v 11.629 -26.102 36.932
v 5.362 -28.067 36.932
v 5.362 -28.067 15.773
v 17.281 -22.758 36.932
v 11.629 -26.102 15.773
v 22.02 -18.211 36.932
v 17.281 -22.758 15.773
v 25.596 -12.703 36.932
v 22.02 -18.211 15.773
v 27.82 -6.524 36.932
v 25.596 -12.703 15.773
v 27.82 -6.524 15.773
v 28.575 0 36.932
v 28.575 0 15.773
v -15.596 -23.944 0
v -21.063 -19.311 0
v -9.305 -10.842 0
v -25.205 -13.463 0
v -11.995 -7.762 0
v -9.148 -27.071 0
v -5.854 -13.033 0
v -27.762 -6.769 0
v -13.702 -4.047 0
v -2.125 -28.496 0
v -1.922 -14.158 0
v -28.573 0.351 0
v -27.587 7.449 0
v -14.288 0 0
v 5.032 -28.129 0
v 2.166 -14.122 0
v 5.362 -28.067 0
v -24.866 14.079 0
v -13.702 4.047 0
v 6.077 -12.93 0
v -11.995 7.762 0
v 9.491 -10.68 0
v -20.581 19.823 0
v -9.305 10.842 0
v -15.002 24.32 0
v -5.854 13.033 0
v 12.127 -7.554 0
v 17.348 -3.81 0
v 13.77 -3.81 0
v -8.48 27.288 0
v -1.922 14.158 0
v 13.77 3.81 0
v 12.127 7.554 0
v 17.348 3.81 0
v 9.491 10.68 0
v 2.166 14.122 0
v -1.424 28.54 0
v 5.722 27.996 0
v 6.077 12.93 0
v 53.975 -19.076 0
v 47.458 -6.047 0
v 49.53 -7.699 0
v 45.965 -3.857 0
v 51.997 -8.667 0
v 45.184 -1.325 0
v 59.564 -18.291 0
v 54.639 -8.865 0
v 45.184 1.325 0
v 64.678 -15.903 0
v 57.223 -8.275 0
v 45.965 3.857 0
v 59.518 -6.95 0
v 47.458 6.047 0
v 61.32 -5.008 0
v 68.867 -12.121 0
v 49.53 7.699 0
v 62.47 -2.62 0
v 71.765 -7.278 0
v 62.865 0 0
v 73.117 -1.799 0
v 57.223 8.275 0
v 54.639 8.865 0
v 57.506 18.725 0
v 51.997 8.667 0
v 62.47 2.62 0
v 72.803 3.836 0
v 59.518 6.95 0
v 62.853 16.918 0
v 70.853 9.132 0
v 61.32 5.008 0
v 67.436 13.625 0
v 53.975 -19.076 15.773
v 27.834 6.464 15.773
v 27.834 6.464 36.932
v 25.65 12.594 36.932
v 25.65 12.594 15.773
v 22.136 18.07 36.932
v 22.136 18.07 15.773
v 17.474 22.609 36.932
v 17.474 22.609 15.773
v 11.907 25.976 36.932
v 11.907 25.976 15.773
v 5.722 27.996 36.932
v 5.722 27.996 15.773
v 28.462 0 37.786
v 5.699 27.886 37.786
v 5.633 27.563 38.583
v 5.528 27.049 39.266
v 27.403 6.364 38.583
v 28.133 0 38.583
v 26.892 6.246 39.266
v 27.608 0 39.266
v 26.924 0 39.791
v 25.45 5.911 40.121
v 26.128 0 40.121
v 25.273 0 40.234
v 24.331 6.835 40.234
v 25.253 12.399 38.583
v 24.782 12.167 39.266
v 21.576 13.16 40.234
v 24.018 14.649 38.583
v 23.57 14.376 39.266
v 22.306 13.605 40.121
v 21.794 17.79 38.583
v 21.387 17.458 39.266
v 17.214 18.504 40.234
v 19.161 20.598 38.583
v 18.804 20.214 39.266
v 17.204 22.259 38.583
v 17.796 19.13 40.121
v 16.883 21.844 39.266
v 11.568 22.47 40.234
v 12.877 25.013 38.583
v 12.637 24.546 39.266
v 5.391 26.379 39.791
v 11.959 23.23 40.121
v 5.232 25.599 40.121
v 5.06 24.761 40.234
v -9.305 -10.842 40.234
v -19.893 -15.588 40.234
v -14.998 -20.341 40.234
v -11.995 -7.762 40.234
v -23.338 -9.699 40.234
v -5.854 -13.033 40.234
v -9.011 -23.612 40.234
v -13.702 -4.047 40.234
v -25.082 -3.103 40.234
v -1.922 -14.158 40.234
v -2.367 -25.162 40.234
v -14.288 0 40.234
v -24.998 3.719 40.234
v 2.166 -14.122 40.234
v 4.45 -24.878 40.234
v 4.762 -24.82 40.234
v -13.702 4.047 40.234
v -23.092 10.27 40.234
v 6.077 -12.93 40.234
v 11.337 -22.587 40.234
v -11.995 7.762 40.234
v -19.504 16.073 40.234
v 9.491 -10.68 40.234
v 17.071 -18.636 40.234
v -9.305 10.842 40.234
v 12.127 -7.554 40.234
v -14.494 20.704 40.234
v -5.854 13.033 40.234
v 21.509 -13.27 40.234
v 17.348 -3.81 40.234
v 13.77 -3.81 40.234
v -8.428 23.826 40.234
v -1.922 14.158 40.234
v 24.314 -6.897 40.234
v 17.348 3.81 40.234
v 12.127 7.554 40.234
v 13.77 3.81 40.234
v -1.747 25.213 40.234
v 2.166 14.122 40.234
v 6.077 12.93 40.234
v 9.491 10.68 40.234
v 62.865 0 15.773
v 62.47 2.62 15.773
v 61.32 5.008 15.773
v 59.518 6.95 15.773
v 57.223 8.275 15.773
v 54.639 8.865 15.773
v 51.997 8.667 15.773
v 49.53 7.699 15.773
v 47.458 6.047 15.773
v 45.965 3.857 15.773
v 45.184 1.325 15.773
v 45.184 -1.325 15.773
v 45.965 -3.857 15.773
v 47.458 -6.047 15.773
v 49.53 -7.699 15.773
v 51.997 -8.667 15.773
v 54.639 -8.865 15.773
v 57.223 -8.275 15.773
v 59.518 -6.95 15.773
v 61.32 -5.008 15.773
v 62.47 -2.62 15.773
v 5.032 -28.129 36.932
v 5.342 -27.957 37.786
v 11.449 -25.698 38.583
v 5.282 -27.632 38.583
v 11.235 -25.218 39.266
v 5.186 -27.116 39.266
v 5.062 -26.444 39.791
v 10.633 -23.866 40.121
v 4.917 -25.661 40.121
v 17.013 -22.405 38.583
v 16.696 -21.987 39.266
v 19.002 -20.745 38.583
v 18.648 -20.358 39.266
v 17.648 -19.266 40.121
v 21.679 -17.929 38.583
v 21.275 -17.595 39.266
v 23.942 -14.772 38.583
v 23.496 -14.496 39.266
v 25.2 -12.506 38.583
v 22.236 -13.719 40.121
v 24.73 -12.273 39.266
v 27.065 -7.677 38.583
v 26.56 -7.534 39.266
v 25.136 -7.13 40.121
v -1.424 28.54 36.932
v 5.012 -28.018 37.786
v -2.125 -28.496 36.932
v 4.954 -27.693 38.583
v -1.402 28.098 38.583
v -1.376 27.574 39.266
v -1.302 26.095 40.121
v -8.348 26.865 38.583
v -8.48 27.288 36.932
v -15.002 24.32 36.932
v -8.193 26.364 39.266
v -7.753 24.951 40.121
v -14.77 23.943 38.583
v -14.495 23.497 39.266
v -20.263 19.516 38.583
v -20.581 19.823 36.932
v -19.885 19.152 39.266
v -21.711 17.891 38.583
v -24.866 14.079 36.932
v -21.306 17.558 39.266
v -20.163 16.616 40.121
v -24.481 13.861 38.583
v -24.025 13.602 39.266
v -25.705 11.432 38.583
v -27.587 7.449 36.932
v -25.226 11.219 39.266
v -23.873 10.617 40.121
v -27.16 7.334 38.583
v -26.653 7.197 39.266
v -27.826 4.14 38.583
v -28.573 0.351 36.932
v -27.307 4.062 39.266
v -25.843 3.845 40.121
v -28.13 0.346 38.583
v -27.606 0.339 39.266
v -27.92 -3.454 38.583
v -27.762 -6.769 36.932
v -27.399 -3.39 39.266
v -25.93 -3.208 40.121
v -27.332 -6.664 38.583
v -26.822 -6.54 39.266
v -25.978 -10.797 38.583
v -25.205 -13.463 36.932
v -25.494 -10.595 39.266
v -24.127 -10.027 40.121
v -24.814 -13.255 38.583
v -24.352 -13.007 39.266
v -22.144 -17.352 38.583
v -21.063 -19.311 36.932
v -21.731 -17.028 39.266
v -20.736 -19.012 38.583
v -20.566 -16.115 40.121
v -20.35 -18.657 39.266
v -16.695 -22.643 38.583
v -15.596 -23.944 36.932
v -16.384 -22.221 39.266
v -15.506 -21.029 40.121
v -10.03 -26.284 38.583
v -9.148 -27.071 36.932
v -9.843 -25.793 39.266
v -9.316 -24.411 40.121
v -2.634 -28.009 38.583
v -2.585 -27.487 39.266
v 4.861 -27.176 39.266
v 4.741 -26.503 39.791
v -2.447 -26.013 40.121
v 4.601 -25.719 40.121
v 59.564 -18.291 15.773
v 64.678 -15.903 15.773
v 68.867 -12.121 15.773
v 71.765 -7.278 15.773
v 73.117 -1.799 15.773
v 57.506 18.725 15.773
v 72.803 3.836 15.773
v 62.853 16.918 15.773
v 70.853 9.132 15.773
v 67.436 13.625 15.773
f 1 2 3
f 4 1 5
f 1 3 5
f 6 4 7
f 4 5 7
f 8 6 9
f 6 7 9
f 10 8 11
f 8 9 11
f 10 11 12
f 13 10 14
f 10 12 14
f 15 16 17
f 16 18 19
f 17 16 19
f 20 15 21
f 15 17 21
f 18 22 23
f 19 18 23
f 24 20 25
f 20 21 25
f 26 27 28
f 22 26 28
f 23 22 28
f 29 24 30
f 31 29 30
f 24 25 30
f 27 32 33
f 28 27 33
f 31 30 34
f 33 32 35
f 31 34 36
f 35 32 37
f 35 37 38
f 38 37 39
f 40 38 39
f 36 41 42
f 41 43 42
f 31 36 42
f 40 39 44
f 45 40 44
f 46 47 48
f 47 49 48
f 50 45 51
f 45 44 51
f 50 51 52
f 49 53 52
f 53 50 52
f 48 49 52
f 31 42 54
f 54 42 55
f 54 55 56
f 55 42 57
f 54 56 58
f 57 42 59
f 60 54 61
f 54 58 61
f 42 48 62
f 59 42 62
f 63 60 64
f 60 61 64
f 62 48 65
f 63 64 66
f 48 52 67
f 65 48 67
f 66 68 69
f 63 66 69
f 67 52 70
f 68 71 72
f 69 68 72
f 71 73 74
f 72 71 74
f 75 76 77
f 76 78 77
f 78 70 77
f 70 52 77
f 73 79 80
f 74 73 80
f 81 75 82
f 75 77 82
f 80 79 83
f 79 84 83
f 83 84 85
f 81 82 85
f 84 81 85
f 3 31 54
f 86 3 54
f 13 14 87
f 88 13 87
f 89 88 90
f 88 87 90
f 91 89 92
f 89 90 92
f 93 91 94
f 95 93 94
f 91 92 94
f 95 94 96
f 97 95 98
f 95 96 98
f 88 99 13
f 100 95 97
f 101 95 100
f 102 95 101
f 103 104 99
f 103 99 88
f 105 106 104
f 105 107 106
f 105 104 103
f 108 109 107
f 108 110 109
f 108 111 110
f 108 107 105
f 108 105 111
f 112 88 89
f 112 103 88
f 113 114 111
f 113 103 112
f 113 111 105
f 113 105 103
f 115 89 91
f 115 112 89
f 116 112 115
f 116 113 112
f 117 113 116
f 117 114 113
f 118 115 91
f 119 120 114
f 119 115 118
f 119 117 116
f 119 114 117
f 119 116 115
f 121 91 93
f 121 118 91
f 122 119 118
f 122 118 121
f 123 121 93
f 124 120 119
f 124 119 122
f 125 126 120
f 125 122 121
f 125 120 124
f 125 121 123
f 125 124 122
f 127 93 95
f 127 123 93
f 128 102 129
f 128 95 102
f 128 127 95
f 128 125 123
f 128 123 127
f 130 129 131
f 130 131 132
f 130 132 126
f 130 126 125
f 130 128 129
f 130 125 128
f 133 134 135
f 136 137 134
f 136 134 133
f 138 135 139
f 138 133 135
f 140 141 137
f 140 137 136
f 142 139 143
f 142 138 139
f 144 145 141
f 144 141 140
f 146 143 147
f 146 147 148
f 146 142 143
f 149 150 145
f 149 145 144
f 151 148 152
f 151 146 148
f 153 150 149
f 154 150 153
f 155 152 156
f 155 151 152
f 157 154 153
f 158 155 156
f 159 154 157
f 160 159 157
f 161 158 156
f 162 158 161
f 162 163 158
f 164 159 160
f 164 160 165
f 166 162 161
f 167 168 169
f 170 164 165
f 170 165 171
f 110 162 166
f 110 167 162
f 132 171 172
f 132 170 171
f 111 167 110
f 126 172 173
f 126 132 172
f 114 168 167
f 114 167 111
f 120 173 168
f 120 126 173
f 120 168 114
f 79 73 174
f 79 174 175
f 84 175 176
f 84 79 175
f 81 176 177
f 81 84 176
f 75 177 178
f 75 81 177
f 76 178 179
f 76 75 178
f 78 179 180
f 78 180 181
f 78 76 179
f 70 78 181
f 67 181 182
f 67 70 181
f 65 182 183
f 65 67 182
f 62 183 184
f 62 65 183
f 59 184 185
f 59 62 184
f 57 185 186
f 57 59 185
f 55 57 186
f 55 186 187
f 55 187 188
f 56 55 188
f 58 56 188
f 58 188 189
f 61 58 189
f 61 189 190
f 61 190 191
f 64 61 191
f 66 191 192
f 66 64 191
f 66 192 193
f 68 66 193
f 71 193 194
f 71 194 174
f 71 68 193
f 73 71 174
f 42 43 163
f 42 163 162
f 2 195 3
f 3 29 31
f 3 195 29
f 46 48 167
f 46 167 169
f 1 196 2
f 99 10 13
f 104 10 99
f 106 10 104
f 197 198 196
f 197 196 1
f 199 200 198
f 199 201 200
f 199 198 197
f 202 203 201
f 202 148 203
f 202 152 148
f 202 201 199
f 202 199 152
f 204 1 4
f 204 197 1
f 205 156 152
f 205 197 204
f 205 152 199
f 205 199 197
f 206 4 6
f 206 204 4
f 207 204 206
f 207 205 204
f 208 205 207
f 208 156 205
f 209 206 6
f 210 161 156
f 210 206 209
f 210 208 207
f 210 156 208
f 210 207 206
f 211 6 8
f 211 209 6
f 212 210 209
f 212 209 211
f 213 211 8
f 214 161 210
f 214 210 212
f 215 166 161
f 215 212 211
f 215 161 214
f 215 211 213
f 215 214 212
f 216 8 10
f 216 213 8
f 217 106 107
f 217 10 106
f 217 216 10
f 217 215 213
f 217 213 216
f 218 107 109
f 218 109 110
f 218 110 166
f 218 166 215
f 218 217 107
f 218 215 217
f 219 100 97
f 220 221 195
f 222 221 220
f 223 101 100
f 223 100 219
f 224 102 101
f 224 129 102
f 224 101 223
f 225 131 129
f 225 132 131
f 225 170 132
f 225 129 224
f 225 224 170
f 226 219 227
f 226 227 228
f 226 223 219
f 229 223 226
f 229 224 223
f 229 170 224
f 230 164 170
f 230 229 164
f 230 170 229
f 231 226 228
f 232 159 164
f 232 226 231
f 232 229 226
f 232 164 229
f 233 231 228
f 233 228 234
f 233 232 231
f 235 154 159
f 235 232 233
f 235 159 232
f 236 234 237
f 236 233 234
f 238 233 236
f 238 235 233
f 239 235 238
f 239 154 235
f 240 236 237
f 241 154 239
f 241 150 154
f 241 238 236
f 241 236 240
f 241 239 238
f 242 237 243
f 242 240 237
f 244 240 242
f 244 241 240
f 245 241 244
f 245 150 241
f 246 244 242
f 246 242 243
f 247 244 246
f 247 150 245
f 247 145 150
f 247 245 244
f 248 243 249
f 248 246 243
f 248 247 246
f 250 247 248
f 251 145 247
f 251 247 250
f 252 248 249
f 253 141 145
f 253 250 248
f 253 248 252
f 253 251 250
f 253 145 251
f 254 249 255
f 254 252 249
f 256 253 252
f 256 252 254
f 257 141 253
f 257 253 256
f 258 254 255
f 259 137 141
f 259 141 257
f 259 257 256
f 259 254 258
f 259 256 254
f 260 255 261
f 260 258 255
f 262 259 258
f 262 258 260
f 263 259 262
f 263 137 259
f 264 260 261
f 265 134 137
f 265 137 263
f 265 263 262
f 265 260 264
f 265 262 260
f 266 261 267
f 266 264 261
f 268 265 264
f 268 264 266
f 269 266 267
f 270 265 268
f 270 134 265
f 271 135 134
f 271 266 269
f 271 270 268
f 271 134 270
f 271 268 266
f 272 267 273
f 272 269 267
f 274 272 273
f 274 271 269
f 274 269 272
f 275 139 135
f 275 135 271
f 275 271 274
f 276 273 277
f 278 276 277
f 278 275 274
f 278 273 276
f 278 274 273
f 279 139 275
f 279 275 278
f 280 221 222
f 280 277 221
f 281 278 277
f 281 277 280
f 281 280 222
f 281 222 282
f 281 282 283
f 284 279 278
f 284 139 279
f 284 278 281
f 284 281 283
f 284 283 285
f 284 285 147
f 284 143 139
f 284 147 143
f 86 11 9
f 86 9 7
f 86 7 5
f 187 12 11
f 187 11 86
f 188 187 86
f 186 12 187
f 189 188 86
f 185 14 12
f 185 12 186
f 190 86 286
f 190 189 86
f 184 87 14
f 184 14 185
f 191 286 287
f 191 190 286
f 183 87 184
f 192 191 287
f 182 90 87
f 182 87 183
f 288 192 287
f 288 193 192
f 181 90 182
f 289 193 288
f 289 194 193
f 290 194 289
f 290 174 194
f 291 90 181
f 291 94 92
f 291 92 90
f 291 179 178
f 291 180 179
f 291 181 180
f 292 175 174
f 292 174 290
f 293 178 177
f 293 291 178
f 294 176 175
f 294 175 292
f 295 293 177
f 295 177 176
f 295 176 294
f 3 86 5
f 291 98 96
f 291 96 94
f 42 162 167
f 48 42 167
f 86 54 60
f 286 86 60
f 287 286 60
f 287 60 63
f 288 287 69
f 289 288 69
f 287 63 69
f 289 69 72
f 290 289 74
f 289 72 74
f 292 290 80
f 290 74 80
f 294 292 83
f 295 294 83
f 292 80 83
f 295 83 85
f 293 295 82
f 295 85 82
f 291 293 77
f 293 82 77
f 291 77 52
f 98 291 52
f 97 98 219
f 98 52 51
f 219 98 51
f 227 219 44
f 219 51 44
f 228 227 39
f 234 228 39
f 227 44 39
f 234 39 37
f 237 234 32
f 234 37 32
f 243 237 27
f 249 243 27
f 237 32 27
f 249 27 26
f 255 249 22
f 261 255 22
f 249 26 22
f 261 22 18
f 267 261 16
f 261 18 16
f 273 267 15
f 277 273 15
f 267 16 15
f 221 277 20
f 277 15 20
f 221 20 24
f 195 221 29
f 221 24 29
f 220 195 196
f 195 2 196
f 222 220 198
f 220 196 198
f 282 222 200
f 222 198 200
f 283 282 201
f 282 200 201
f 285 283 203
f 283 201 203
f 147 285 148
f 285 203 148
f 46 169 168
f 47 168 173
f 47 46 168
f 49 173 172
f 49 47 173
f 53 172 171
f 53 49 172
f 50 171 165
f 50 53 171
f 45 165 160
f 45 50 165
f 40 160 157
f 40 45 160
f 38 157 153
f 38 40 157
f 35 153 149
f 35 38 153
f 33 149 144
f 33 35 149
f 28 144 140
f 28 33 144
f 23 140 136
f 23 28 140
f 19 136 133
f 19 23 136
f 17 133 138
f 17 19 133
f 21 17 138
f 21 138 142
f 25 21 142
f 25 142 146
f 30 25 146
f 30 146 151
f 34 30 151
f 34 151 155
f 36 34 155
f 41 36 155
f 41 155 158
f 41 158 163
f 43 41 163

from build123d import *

# Parameters (mm, degrees)
F0_R     = 14.2875
F0_R_2   = 8.89
F1_DEPTH = 15.7734
F2_DEPTH = 40.2336
F4_DEPTH = 40.2346
F5_R     = 3.302


with BuildPart() as f1:
    # F0 (on Top) → F1 (new body)
    with BuildSketch(Plane.XY):
        with BuildLine():
            ThreePointArc((5.362369, -28.067341), (22.019995, -18.211273), (28.575, 0))
            ThreePointArc((28.575, 0), (22.13622, 18.06982), (5.721568, 27.996326))
            ThreePointArc((5.721568, 27.996326), (-28.572841, 0.351263), (5.031592, -28.128521))
            Line((5.031592, -28.128521), (5.362369, -28.067341))
        make_face()
        Circle(F0_R, mode=Mode.SUBTRACT)
        with BuildLine():
            ThreePointArc((5.721568, 27.996326), (22.13622, 18.06982), (28.575, 0))
            ThreePointArc((28.575, 0), (22.019995, -18.211273), (5.362369, -28.067341))
            Line((5.362369, -28.067341), (53.975, -19.075971))
            ThreePointArc((53.975, -19.075971), (73.116672, -1.798756), (57.506479, 18.725075))
            Line((57.506479, 18.725075), (5.721568, 27.996326))
        make_face()
        with Locations((53.975, 0)):
            Circle(F0_R_2, mode=Mode.SUBTRACT)
    extrude(amount=F1_DEPTH)

    # F0 (on Top) → F2 (join)
    with BuildSketch(Plane.XY):
        with BuildLine():
            ThreePointArc((5.362369, -28.067341), (22.019995, -18.211273), (28.575, 0))
            ThreePointArc((28.575, 0), (22.13622, 18.06982), (5.721568, 27.996326))
            ThreePointArc((5.721568, 27.996326), (-28.572841, 0.351263), (5.031592, -28.128521))
            Line((5.031592, -28.128521), (5.362369, -28.067341))
        make_face()
        Circle(F0_R, mode=Mode.SUBTRACT)
    extrude(amount=F2_DEPTH)

    # F3 (on face) → F4 (cut, through all)
    with BuildSketch(Plane.XY):
        with BuildLine():
            Line((17.348139, 3.81), (13.770133, 3.81))
            ThreePointArc((13.770133, 3.81), (14.157567, 1.922483), (14.2875, 0))
            ThreePointArc((14.2875, 0), (14.157567, -1.922483), (13.770133, -3.81))
            Line((13.770133, -3.81), (17.348139, -3.81))
            Line((17.348139, -3.81), (17.348139, 3.81))
        make_face()
    extrude(amount=F4_DEPTH, mode=Mode.SUBTRACT)

    # F5
    f5_edges = [f1.edges().sort_by_distance(p)[0] for p in [
        (-5.19707, 28.098418, 40.2336),
    ]]
    fillet(f5_edges, radius=F5_R)


solid = f1.part
